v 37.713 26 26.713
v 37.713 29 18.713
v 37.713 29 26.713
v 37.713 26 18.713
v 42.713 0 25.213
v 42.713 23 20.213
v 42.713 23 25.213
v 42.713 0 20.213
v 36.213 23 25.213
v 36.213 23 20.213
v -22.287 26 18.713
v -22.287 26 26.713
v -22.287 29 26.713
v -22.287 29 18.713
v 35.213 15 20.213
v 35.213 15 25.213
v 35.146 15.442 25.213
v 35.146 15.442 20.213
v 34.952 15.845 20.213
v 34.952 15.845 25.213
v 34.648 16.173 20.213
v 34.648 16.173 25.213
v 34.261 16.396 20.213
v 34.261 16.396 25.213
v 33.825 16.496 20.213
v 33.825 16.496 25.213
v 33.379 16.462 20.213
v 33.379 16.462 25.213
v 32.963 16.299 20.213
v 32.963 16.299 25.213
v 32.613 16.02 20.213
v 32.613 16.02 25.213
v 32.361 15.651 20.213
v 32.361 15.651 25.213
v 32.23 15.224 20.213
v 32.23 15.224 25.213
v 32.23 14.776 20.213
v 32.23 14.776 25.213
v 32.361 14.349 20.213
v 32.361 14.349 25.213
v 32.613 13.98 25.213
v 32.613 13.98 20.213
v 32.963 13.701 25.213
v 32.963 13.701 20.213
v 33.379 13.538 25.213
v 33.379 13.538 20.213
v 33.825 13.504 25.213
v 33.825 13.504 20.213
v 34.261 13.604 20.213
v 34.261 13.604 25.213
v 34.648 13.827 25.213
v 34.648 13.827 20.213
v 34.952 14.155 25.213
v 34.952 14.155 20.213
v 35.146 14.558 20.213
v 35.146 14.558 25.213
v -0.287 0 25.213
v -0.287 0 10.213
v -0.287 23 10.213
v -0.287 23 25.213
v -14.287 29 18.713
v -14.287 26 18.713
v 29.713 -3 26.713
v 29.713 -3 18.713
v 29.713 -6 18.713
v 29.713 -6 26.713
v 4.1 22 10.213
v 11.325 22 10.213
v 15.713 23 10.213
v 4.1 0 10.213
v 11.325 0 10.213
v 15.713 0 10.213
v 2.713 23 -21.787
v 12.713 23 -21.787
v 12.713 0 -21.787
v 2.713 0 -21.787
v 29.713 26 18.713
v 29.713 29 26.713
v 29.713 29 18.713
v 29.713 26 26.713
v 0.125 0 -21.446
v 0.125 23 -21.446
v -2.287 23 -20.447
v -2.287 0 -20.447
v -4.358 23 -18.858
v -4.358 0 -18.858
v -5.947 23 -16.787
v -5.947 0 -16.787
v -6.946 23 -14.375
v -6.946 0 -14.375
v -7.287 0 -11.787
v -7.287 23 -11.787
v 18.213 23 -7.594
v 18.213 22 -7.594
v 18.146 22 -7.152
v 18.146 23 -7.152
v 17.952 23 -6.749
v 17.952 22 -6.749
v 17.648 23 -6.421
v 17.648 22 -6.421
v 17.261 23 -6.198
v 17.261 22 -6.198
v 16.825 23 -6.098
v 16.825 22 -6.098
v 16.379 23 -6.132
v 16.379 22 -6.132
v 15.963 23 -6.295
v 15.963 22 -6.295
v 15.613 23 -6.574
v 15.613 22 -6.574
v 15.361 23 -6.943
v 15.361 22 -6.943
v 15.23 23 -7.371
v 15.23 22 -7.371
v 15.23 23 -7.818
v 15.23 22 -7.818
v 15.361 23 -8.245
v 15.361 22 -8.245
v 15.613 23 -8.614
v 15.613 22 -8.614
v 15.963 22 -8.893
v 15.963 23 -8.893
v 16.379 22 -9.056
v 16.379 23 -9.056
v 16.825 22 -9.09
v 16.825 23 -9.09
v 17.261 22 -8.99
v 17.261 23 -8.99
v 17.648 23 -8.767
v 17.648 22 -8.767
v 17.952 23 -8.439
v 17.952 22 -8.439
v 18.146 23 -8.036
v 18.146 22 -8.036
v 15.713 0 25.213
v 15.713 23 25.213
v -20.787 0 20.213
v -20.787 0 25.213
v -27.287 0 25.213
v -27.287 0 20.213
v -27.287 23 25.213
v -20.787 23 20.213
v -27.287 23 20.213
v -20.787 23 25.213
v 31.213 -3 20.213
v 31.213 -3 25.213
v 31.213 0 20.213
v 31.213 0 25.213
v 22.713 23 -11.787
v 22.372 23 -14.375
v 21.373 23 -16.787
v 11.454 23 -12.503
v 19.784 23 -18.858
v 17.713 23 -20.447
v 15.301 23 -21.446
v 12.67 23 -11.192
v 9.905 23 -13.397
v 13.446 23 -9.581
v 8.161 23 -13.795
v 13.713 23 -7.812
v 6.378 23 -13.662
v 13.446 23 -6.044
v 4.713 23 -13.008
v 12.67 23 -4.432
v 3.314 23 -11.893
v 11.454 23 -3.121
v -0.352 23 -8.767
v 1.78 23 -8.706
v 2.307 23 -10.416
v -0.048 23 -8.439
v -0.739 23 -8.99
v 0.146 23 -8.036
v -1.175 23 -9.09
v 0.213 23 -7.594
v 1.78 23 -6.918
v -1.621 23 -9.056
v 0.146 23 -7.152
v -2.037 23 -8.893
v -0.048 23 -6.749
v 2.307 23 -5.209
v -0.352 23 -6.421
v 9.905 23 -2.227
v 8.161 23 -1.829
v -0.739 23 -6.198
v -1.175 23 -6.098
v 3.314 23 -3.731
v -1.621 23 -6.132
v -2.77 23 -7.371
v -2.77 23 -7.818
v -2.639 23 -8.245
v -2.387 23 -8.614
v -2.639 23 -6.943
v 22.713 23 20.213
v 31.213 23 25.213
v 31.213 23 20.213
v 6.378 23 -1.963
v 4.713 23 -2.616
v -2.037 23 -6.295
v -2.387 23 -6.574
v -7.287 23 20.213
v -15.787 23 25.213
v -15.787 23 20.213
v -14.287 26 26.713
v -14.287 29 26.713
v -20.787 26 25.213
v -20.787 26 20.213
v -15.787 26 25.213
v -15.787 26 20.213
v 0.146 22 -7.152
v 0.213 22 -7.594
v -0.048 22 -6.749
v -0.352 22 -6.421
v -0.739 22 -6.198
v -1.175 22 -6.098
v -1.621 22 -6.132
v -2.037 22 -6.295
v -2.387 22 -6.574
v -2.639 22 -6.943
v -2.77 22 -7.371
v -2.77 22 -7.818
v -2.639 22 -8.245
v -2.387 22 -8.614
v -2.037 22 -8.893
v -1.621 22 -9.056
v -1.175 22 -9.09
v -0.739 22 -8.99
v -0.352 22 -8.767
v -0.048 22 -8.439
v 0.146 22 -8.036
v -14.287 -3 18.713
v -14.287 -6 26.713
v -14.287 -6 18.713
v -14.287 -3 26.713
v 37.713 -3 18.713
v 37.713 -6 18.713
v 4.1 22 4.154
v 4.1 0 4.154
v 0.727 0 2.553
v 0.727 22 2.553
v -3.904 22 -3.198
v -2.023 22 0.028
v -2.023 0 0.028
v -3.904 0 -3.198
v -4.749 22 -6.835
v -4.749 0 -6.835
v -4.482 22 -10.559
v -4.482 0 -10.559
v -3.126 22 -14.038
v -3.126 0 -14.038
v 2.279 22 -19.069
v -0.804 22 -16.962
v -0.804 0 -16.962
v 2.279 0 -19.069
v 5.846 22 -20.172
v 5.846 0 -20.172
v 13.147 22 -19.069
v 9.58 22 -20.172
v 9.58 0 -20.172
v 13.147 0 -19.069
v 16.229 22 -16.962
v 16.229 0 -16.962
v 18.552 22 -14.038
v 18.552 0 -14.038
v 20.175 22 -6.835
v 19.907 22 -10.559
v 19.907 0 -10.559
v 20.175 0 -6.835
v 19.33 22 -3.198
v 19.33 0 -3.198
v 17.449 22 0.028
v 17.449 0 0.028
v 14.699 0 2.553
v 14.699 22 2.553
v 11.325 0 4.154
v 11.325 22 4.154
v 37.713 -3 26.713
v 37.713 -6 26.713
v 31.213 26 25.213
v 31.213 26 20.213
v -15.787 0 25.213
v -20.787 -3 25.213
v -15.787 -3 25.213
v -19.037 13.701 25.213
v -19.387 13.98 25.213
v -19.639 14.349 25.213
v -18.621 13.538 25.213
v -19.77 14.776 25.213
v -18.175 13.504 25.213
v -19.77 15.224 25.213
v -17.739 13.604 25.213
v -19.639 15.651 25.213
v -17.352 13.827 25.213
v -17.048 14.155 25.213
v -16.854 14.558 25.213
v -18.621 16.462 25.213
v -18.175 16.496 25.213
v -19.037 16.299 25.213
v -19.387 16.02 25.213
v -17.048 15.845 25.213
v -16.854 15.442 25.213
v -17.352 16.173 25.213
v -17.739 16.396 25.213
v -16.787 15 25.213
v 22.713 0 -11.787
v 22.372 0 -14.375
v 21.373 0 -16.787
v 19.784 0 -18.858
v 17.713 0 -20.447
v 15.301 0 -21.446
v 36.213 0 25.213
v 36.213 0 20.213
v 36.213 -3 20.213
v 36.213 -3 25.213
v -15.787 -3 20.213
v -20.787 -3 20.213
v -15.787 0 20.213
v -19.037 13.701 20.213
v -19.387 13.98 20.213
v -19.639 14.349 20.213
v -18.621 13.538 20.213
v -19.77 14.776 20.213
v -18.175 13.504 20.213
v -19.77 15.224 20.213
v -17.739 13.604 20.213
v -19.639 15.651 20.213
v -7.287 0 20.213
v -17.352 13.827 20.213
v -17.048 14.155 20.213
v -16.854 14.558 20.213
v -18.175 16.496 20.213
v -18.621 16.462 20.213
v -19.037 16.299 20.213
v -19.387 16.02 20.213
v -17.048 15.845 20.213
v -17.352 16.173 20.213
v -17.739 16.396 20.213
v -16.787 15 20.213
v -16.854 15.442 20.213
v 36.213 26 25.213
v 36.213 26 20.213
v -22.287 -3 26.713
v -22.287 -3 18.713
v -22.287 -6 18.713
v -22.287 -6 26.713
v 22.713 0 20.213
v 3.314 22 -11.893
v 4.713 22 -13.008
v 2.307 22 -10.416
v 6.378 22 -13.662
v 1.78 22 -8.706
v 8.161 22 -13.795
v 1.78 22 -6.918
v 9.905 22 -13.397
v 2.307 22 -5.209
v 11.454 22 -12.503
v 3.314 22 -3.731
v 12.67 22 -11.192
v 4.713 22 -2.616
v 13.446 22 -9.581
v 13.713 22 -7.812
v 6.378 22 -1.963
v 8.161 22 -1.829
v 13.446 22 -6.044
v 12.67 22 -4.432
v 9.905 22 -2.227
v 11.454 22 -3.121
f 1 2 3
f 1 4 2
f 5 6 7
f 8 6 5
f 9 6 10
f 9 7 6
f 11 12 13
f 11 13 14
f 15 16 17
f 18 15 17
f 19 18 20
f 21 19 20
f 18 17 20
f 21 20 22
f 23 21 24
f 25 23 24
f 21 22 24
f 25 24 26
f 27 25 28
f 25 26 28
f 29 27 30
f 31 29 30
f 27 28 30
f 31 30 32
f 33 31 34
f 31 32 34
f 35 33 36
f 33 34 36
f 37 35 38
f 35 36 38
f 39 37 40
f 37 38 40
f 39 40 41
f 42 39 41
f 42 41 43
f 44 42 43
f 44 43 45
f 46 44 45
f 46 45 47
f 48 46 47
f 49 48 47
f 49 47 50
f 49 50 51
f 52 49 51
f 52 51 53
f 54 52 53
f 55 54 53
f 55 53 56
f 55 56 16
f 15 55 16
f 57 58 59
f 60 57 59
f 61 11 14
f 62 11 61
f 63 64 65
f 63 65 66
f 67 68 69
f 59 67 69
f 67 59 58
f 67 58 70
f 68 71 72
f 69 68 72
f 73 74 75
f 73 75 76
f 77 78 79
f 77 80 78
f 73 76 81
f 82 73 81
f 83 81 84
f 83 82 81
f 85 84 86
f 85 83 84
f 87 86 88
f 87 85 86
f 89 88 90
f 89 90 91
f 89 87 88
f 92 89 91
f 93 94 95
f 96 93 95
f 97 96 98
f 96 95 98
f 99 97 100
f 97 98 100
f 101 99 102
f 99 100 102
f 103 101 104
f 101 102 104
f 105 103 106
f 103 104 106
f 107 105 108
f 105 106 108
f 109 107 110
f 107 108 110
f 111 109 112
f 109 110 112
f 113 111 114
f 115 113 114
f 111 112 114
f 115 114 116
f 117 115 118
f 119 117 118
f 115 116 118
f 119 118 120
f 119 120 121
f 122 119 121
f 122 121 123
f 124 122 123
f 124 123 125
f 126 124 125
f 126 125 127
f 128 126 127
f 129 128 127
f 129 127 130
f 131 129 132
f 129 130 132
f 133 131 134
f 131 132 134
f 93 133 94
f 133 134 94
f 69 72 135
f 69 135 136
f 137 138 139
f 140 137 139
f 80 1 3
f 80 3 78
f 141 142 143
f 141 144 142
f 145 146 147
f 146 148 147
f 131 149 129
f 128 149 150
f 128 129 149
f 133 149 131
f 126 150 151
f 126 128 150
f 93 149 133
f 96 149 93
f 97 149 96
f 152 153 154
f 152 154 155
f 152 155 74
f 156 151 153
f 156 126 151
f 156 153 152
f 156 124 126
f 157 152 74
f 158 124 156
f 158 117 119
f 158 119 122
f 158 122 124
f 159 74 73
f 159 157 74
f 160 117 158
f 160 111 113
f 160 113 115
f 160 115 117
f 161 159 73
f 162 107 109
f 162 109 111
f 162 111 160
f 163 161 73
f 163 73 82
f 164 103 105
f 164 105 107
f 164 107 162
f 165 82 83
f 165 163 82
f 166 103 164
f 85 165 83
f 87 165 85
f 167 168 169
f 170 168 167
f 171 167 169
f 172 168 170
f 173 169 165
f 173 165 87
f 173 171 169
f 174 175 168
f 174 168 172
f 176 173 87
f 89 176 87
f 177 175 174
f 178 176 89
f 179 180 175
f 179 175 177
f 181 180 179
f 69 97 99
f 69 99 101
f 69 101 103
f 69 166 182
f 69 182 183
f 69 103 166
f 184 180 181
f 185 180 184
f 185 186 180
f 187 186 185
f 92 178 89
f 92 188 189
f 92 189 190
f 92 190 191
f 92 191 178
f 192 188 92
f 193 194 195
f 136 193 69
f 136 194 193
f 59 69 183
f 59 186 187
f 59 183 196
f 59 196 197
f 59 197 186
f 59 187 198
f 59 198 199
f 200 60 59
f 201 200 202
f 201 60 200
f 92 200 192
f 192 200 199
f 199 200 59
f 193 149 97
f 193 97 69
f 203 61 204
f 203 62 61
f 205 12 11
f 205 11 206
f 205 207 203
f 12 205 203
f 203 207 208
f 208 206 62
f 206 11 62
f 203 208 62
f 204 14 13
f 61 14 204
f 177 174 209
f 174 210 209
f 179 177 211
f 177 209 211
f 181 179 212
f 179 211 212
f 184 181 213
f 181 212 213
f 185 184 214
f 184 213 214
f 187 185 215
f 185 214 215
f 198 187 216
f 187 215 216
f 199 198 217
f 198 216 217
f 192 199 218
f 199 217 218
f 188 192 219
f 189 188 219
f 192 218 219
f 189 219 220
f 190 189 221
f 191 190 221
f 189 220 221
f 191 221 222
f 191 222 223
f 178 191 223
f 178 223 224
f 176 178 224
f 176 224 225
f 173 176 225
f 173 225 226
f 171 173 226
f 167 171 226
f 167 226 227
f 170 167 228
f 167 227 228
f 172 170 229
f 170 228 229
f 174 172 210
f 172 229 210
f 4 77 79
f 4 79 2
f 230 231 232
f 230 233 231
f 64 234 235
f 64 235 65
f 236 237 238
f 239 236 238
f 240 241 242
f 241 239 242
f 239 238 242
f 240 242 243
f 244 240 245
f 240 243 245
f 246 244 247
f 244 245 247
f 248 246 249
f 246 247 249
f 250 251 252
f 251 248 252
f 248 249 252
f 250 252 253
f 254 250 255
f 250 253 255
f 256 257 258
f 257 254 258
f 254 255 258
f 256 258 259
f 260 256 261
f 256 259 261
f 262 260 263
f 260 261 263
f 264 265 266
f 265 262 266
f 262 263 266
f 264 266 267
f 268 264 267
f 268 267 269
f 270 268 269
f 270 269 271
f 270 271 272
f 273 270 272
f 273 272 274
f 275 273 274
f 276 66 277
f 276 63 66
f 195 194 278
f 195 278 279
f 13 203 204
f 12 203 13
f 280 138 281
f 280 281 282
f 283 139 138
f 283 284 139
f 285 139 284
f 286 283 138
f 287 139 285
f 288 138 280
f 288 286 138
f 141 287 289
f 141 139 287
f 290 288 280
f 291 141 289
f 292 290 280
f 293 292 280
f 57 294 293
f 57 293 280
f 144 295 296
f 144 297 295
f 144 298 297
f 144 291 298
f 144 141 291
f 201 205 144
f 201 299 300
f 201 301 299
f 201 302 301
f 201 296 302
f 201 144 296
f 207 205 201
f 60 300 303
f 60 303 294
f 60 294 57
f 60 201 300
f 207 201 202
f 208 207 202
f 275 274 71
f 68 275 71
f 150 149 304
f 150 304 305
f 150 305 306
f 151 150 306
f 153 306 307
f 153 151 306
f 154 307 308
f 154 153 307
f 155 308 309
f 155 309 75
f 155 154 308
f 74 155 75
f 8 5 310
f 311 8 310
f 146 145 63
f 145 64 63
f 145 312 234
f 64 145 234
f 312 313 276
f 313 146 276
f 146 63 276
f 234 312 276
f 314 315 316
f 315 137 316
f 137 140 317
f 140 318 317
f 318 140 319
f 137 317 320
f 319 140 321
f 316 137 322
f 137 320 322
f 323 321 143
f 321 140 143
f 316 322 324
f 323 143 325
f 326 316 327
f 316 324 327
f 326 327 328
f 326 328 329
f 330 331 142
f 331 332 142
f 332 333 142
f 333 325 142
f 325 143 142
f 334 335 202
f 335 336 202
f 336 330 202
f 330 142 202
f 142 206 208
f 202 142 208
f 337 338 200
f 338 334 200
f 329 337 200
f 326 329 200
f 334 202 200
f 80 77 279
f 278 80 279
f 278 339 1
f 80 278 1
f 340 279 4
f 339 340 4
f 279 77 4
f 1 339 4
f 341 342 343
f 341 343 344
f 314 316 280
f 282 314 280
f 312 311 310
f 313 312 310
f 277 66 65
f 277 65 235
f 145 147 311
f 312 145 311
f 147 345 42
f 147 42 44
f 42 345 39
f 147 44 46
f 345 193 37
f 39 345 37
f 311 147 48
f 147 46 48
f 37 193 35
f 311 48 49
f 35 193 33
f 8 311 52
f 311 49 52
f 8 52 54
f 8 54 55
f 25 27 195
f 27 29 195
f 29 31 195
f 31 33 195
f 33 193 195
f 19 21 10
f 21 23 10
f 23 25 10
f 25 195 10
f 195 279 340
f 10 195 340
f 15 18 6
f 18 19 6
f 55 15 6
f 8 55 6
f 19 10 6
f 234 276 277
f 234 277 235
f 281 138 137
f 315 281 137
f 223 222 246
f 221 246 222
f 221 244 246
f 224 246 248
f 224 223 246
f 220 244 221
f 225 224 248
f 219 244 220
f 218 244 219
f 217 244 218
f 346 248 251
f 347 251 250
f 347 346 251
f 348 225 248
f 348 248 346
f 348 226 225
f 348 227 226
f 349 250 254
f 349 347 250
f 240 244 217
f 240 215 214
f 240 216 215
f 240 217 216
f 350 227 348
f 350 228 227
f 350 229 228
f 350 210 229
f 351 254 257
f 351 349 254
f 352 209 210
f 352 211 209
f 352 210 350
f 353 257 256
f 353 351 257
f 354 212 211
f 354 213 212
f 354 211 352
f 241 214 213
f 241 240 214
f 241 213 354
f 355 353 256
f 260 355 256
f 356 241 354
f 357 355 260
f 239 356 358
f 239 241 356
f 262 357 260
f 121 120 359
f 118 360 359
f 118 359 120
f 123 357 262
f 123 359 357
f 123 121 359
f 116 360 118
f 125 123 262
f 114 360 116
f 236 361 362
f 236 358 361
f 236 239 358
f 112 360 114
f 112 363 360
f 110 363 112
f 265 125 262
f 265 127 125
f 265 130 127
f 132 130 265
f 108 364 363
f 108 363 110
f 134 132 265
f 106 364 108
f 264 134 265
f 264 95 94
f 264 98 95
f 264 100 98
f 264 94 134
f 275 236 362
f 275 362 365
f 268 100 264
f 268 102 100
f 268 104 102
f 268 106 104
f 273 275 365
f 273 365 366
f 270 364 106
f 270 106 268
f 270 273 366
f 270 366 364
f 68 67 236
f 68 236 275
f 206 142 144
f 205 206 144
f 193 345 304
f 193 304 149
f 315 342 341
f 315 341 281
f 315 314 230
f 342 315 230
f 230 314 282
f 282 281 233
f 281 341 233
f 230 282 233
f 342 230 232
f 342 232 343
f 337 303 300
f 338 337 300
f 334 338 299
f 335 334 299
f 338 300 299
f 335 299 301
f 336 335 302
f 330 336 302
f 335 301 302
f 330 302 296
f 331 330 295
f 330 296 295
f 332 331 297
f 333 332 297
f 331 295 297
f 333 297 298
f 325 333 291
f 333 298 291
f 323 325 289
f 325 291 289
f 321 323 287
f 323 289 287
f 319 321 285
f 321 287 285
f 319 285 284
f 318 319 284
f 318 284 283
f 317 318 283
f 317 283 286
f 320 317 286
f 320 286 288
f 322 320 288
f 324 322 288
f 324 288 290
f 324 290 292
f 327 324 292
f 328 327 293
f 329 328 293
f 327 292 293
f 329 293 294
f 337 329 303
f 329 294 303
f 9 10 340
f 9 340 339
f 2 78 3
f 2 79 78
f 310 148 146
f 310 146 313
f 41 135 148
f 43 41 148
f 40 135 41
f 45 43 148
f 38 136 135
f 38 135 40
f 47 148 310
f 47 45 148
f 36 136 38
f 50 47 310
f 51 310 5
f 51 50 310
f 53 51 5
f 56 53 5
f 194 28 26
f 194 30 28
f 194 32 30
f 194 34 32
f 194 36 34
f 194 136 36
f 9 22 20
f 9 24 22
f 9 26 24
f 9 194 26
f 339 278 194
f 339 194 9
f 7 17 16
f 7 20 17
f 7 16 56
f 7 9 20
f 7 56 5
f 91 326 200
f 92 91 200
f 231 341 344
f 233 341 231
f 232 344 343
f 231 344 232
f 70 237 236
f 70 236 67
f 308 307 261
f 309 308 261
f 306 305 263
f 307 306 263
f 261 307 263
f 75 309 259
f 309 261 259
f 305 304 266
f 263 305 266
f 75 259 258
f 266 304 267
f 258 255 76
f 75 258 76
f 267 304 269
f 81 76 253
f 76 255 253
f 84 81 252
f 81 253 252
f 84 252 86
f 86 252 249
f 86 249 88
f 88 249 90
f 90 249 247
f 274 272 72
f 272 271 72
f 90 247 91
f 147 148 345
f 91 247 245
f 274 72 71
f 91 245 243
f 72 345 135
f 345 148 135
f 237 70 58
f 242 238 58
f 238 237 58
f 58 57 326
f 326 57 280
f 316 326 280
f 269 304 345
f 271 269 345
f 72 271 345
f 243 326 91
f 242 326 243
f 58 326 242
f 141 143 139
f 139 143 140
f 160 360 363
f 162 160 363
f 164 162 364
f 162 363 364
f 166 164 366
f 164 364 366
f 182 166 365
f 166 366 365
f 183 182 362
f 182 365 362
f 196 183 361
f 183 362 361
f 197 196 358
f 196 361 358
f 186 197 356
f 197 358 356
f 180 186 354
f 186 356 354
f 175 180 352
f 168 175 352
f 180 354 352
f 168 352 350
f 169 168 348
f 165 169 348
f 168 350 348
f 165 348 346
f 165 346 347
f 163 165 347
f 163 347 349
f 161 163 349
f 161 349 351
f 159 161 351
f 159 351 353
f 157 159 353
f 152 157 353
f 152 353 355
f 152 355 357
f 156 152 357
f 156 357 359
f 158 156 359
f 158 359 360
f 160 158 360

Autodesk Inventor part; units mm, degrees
ref_plane "YZ Plane" through (0, 0, 0) normal (1, 0, 0) x (0, 1, 0)
ref_plane "XZ Plane" through (0, 0, 0) normal (0, 1, 0) x (-1, 0, 0)
ref_plane "XY Plane" through (0, 0, 0) normal (0, 0, 1) x (1, 0, 0)
sketch "Esquisse1" plane through (0, 0, 0) normal (0, 1, 0) x (-1, 0, 0)
  line L0 (7.2872, 10.2128) -> (-22.7128, 10.2128)
  line L1 (-22.7128, 10.2128) -> (-22.7128, -19.7872)
  line L2 (-22.7128, -19.7872) -> (7.2872, -19.7872)
  line L3 (7.2872, -19.7872) -> (7.2872, 10.2128)
  point P0 (0, 0)
  dimension "d0" = 30
  dimension "d1" = 30
extrude "Extrusion1" add sketch "Esquisse1" along normal blind 23
ref_plane "Plan médian" through (7.7128, 0, 10.2128) normal (1, 0, 0) x (0, 0, -1)
sketch "Esquisse4" plane through (0, 0, 0) normal (0, -1, 0) x (1, 0, 0)
  circle A0 centre (7.7128, -7.8122) radius 11.975 projected
  line L0 (-7.2872, 10.2128) -> (22.7128, 10.2128) projected
  line L1 (4.1002, 3.6049) -> (4.1002, 10.2128)
  line L2 (11.3254, 3.6049) -> (11.3254, 10.2128)
  point P0 (0, 0)
extrude "Extrusion2" cut sketch "Esquisse4" against normal blind 22
sketch "Esquisse5" plane through (0, 22, 0) normal (0, -1, 0) x (1, 0, 0)
  circle A0 centre (7.7128, -7.8122) radius 6 projected
  circle A1 centre (16.7128, -7.5941) radius 1.5
  circle A2 centre (-1.2872, -7.5941) radius 1.5
  point P0 (0, 0)
  dimension "d66" = 3
  dimension "d67" = 3
  dimension "d68" = 9
  dimension "d69" = 9
extrude "Extrusion3" cut sketch "Esquisse5" against normal through all
sketch "Esquisse6" plane through (-7.2872, 23, 10.2128) normal (0, 0, 1) x (1, 0, 0)
  line L0 (0, -23) -> (11.3874, -23) projected
  line L1 (5.9558, 0) -> (8.4558, 0) projected
  line L2 (0, -23) -> (7, -23)
  line L3 (7, -23) -> (7, 0)
  line L4 (7, 0) -> (0, 0)
  line L5 (0, 0) -> (0, -23)
  line L6 (30, -23) -> (30, 0) projected
  line L7 (0, 0) -> (30, 0) projected
  line L8 (30, -23) -> (23, -23)
  line L9 (23, -23) -> (23, 0)
  line L10 (23, 0) -> (30, 0)
  line L11 (30, 0) -> (30, -23)
  point P0 (7.2872, -23)
  point P1 (12, -23)
  point P2 (11.5355, -23)
  dimension "d8" = 7
  dimension "d9" = 7
extrude "Extrusion4" add sketch "Esquisse6" along normal blind 10
sketch "Esquisse7" plane through (-7.2872, 23, 20.2128) normal (0, 0, 1) x (1, 0, 0)
  line L0 (7, 0) -> (-20, 0)
  line L1 (-20, 0) -> (-20, -23)
  line L2 (-20, -23) -> (7, -23)
  line L3 (7, -23) -> (7, 0)
  line L4 (30, 0) -> (0, 0) projected
  line L5 (23, 0) -> (50, 0)
  line L6 (50, 0) -> (50, -23)
  line L7 (50, -23) -> (23, -23)
  line L8 (23, -23) -> (23, 0)
  line L9 (0, 0) -> (0, -23) projected
  line L10 (30, -23) -> (30, 0) projected
  point P0 (7.2872, -23)
  dimension "d12" = 20
  dimension "d13" = 20
extrude "Extrusion5" add sketch "Esquisse7" along normal blind 5
sketch "Esquisse8" plane through (0, 23, 0) normal (0, 1, 0) x (1, 0, 0)
  line L0 (36.2128, -25.2128) -> (31.2128, -25.2128)
  line L1 (31.2128, -25.2128) -> (31.2128, -20.2128)
  line L2 (31.2128, -20.2128) -> (36.2128, -20.2128)
  line L3 (36.2128, -20.2128) -> (36.2128, -25.2128)
  line L4 (42.7128, -20.2128) -> (42.7128, -25.2128) projected
  line L5 (42.7128, -20.2128) -> (22.7128, -20.2128) projected
  line L6 (-0.2872, -25.2128) -> (-27.2872, -25.2128) projected
  line L7 (-27.2872, -20.2128) -> (-27.2872, -25.2128) projected
  line L8 (-20.7872, -25.2128) -> (-15.7872, -25.2128)
  line L9 (-15.7872, -25.2128) -> (-15.7872, -20.2128)
  line L10 (-15.7872, -20.2128) -> (-20.7872, -20.2128)
  line L11 (-20.7872, -20.2128) -> (-20.7872, -25.2128)
  line L12 (-7.2872, -20.2128) -> (-27.2872, -20.2128) projected
  point P0 (0, 0)
  point P1 (-0.4939, -25.2128)
  dimension "d16" = 6.5
  dimension "d17" = 5
  dimension "d18" = 5
  dimension "d19" = 0
  dimension "d53" = 5
  dimension "d54" = 5
  dimension "d55" = 0
  dimension "d57" = 6.5
extrude "Extrusion6" add sketch "Esquisse8" along normal blind 3 contours L0 L1 L2 L3 | L6 L11 L10 L9
sketch "Esquisse9" plane through (0, 26, 0) normal (0, 1, 0) x (1, 0, 0)
  line L0 (37.7128, -26.7128) -> (29.7128, -26.7128)
  line L1 (29.7128, -26.7128) -> (29.7128, -18.7128)
  line L2 (29.7128, -18.7128) -> (37.7128, -18.7128)
  line L3 (37.7128, -18.7128) -> (37.7128, -26.7128)
  line L4 (42.7128, -20.2128) -> (42.7128, -25.2128) projected
  line L5 (-27.2872, -25.2128) -> (-0.2872, -25.2128) projected
  line L6 (-27.2872, -20.2128) -> (-27.2872, -25.2128) projected
  line L7 (31.2128, -25.2128) -> (15.7128, -25.2128) projected
  line L8 (-14.2872, -26.7128) -> (-22.2872, -26.7128)
  line L9 (-22.2872, -26.7128) -> (-22.2872, -18.7128)
  line L10 (-22.2872, -18.7128) -> (-14.2872, -18.7128)
  line L11 (-14.2872, -18.7128) -> (-14.2872, -26.7128)
  point P0 (0, 0)
  point P1 (-13.7872, -25.2128)
  dimension "d25" = 8
  dimension "d26" = 5
  dimension "d59" = 8
  dimension "d60" = 1.5
  dimension "d62" = 5
  dimension "d63" = 1.5
  dimension "d64" = 8
  dimension "d65" = 8
extrude "Extrusion7" add sketch "Esquisse9" along normal blind 3
sketch "Esquisse10" plane through (22.7128, 23, -19.7872) normal (0, 0, -1) x (-1, 0, 0)
  line L0 (0, -23) -> (15, -23) projected
  line L1 (15, -23) -> (15, -1) projected
  line L2 (15, -23) -> (30, -23) projected
  line L3 (30, -23) -> (30, 0) projected
  line L4 (0, 0) -> (30, 0) projected
  line L5 (0, -23) -> (0, 0) projected
  line L6 (0, 0) -> (30, 0)
  line L7 (30, 0) -> (30, -23)
  line L8 (30, -23) -> (0, -23)
  line L9 (0, -23) -> (0, 0)
  point P0 (22.7128, -23)
extrude "Extrusion8" add sketch "Esquisse10" along normal blind 2
fillet "Congé1" radius 10 2 edges at (22.7128, 11.5, -21.7872) (-7.2872, 11.5, -21.7872)
sketch "Esquisse12" plane through (0, 0, 0) normal (0, -1, 0) x (1, 0, 0)
  arc A0 (4.1002, 3.6049) -> (11.3254, 3.6049) centre (7.7128, -7.8122) ccw projected
  circle A1 centre (7.7128, -7.8122) radius 12.5
  point P0 (0, 0)
  dimension "d42" = 25
extrude "Extrusion10" cut sketch "Esquisse12" against normal up to surface (22 mm away)
sketch "Esquisse13" plane through (-7.2872, 23, 25.2128) normal (0, 0, 1) x (1, 0, 0)
  circle A0 centre (-11, -8) radius 1.5
  circle A1 centre (41, -8) radius 1.5
  line L0 (7, 0) -> (-20, 0) projected
  line L1 (-20, 0) -> (-20, -23) projected
  line L2 (50, 0) -> (23, 0) projected
  line L3 (50, -23) -> (50, 0) projected
  point P0 (7.2872, -23)
  dimension "d45" = 3
  dimension "d46" = 3
  dimension "d49" = 8
  dimension "d50" = 9
  dimension "d51" = 8
  dimension "d52" = 9
extrude "Extrusion11" cut sketch "Esquisse13" against normal through all
sketch "Esquisse14" plane through (0, 0, 0) normal (0, -1, 0) x (1, 0, 0)
  line L0 (-27.2872, 20.2128) -> (-7.2872, 20.2128) projected
  line L1 (-27.2872, 25.2128) -> (-0.2872, 25.2128) projected
  line L2 (-20.7872, 20.2128) -> (-15.7872, 20.2128)
  line L3 (-15.7872, 20.2128) -> (-15.7872, 25.2128)
  line L4 (-15.7872, 25.2128) -> (-20.7872, 25.2128)
  line L5 (-20.7872, 25.2128) -> (-20.7872, 20.2128)
  line L6 (-27.2872, 20.2128) -> (-27.2872, 25.2128) projected
  line L7 (15.7128, 25.2128) -> (42.7128, 25.2128) projected
  line L8 (31.2128, 20.2128) -> (36.2128, 20.2128)
  line L9 (36.2128, 20.2128) -> (36.2128, 25.2128)
  line L10 (36.2128, 25.2128) -> (31.2128, 25.2128)
  line L11 (31.2128, 25.2128) -> (31.2128, 20.2128)
  line L12 (42.7128, 20.2128) -> (42.7128, 25.2128) projected
  point P0 (0, 0)
  dimension "d70" = 6.5
  dimension "d71" = 5
  dimension "d72" = 6.5
  dimension "d73" = 5
  dimension "d74" = 5
extrude "Extrusion12" add sketch "Esquisse14" along normal blind 3 contours L5 L1 L3 L0 | L7 L9 L8 L11
sketch "Esquisse17" plane through (0, -3, 0) normal (0, -1, 0) x (1, 0, 0)
  line L0 (37.7128, 18.7128) -> (29.7128, 18.7128)
  line L1 (29.7128, 18.7128) -> (29.7128, 26.7128)
  line L2 (29.7128, 26.7128) -> (37.7128, 26.7128)
  line L3 (37.7128, 26.7128) -> (37.7128, 18.7128)
  line L4 (-14.2872, 18.7128) -> (-22.2872, 18.7128)
  line L5 (-22.2872, 18.7128) -> (-22.2872, 26.7128)
  line L6 (-22.2872, 26.7128) -> (-14.2872, 26.7128)
  line L7 (-14.2872, 26.7128) -> (-14.2872, 18.7128)
  line L8 (-27.2872, 20.2128) -> (-27.2872, 25.2128) projected
  line L9 (-20.7872, 20.2128) -> (-15.7872, 20.2128) projected
  line L10 (42.7128, 20.2128) -> (42.7128, 25.2128) projected
  line L11 (31.2128, 20.2128) -> (36.2128, 20.2128) projected
  point P0 (0, 0)
  dimension "d86" = 5
  dimension "d87" = 8
  dimension "d88" = 8
  dimension "d89" = 1.5
  dimension "d90" = 5
  dimension "d91" = 8
  dimension "d92" = 8
  dimension "d93" = 1.5
extrude "Extrusion14" add sketch "Esquisse17" along normal blind 3
properties part number "support_codeur"
